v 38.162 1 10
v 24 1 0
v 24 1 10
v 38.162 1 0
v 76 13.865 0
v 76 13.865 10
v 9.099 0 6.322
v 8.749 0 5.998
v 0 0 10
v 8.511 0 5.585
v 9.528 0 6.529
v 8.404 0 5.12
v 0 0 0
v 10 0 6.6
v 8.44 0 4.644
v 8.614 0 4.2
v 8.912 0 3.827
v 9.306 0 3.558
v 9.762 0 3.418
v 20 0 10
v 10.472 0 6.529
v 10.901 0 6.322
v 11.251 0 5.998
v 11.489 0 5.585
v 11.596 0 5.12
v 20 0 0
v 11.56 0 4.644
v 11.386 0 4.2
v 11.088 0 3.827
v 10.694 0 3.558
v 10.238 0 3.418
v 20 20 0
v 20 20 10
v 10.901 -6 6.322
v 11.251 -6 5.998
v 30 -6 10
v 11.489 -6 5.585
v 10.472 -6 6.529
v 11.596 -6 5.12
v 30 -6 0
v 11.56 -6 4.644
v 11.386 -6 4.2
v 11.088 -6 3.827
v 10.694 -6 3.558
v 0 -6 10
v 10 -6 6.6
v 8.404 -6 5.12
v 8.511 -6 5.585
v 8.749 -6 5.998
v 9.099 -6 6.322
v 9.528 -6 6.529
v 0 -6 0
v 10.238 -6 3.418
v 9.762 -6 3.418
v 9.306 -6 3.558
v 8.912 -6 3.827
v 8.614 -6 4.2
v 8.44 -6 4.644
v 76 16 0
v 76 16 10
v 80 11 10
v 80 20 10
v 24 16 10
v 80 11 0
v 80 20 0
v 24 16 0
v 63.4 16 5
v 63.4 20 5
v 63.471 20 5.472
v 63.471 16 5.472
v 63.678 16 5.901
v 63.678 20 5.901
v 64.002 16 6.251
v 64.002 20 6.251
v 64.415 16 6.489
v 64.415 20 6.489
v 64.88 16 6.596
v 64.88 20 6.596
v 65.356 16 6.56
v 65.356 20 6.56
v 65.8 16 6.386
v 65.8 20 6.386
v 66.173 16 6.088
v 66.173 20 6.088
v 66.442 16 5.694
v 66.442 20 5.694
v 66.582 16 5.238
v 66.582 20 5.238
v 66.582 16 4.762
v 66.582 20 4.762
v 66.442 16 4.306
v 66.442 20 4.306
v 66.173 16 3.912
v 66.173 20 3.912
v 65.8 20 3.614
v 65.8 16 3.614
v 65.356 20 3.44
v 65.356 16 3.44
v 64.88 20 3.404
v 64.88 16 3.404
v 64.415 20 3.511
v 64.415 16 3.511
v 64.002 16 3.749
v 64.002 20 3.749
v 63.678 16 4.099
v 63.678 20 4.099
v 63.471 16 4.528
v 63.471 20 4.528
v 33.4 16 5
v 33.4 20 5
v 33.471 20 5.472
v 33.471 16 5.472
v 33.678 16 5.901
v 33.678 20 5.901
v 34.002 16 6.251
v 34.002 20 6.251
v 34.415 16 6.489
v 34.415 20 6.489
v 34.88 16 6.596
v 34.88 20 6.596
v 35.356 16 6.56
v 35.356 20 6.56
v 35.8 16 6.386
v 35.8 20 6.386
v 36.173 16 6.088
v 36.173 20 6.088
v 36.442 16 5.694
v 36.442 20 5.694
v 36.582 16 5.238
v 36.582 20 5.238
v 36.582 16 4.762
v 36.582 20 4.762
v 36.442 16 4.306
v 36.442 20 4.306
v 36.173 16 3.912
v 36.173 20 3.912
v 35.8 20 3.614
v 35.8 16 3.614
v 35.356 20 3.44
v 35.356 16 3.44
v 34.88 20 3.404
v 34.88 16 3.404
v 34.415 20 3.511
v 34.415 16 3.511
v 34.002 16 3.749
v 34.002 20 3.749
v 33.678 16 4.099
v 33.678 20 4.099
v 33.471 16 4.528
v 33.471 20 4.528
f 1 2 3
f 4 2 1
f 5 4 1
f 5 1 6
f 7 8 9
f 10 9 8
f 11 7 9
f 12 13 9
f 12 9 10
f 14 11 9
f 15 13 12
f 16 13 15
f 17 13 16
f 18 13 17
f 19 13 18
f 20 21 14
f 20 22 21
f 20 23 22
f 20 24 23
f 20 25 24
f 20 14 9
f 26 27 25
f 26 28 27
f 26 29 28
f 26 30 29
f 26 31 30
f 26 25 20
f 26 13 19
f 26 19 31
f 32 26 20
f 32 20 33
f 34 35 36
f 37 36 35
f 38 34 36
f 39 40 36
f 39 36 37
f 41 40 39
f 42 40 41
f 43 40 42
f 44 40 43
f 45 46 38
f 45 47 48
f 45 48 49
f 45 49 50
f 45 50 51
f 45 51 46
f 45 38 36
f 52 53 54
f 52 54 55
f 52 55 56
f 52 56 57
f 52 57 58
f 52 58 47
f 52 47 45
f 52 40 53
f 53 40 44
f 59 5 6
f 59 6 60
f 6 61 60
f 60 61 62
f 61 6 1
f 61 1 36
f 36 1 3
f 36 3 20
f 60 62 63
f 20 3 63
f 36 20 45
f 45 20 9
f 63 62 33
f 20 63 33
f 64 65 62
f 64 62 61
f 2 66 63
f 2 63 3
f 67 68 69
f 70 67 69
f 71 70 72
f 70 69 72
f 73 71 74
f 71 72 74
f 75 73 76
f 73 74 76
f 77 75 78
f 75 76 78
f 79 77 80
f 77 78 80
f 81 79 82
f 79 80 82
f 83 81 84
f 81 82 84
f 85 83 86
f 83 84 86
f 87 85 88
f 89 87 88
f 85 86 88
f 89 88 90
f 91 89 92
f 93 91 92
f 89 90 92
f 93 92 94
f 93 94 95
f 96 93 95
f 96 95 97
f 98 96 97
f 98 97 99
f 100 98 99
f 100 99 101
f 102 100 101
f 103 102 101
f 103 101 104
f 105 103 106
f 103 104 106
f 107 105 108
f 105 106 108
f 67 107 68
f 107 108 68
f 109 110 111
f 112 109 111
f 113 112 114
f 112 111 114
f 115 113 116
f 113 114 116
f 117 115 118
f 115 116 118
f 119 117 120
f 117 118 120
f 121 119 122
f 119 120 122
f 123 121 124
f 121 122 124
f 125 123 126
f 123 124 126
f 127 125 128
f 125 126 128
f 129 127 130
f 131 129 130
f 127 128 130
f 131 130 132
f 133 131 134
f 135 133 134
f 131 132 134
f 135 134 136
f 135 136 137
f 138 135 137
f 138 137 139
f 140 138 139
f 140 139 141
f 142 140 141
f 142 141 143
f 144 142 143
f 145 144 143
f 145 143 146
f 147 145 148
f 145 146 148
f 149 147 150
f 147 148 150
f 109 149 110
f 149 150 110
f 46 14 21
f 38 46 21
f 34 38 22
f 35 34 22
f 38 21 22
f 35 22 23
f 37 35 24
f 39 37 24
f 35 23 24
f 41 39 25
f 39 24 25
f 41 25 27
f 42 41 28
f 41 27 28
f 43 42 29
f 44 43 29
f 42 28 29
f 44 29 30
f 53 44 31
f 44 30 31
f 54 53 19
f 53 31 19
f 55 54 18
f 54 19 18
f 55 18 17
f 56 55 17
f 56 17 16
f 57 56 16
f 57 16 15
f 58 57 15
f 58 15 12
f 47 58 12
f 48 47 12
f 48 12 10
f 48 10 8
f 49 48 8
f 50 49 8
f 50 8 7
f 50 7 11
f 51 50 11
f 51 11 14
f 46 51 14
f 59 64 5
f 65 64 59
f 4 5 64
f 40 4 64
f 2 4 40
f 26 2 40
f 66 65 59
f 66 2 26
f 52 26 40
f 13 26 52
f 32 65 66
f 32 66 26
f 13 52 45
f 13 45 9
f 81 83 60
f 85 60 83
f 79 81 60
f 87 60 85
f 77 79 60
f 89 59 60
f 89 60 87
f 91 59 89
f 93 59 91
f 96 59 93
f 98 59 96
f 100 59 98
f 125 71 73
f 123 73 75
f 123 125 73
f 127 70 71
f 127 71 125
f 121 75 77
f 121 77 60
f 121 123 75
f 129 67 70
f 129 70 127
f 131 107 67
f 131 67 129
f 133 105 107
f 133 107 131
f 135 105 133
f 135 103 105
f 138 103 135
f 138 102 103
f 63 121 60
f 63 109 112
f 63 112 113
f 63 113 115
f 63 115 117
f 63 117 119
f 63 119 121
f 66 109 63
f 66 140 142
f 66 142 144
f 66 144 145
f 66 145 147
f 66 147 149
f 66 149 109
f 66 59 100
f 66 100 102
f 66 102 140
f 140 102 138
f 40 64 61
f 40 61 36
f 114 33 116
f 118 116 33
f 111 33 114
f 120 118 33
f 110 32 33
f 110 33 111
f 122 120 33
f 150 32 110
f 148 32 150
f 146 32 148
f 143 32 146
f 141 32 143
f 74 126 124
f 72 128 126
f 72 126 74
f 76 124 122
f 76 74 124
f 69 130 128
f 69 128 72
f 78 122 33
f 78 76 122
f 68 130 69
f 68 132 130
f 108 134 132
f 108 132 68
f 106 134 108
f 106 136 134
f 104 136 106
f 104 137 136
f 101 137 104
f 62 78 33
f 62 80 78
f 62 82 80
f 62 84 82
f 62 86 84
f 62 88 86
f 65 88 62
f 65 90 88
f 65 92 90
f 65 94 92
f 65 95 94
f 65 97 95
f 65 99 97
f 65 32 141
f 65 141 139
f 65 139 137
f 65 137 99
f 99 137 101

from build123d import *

# Parameters (mm, degrees)
EXTRUDE_1_DEPTH     = 10
SKETCH_2_R          = 1.6
CUT_EXTRUDE_1_DEPTH = 84.066238629
SKETCH_3_R          = 1.6
CUT_EXTRUDE_2_DEPTH = 4


with BuildPart() as part:
    # 草图1 → 凸台-拉伸1 (new body)
    with BuildSketch(Plane.XY):
        Polygon((0, 0), (20, 0), (20, 20), (80, 20), (80, 11), (30, -6), (0, -6), align=None)
        Polygon((24, 16), (24, 1), (38.162121481, 1), (76, 13.864878696), (76, 16), align=None, mode=Mode.SUBTRACT)
    extrude(amount=EXTRUDE_1_DEPTH)

    # 草图2 → 切除-拉伸1 (cut, through all)
    with BuildSketch(Plane(origin=(0, 0, 0), x_dir=(1, 0, 0), z_dir=(0, 1, 0))):
        with Locations(Location((10, -5, 0), (0, 0, 270))):
            Circle(SKETCH_2_R)
    extrude(amount=-CUT_EXTRUDE_1_DEPTH, mode=Mode.SUBTRACT)

    # 草图3 → 切除-拉伸2 (cut)
    with BuildSketch(Plane(origin=(0, 20, 0), x_dir=(1, 0, 0), z_dir=(0, 1, 0))):
        with Locations(Location((65, -5, 0), (0, 0, 180))):
            Circle(SKETCH_3_R)
        with Locations(Location((35, -5, 0), (0, 0, 180))):
            Circle(SKETCH_3_R)
    extrude(amount=-CUT_EXTRUDE_2_DEPTH, mode=Mode.SUBTRACT)


solid = part.part
